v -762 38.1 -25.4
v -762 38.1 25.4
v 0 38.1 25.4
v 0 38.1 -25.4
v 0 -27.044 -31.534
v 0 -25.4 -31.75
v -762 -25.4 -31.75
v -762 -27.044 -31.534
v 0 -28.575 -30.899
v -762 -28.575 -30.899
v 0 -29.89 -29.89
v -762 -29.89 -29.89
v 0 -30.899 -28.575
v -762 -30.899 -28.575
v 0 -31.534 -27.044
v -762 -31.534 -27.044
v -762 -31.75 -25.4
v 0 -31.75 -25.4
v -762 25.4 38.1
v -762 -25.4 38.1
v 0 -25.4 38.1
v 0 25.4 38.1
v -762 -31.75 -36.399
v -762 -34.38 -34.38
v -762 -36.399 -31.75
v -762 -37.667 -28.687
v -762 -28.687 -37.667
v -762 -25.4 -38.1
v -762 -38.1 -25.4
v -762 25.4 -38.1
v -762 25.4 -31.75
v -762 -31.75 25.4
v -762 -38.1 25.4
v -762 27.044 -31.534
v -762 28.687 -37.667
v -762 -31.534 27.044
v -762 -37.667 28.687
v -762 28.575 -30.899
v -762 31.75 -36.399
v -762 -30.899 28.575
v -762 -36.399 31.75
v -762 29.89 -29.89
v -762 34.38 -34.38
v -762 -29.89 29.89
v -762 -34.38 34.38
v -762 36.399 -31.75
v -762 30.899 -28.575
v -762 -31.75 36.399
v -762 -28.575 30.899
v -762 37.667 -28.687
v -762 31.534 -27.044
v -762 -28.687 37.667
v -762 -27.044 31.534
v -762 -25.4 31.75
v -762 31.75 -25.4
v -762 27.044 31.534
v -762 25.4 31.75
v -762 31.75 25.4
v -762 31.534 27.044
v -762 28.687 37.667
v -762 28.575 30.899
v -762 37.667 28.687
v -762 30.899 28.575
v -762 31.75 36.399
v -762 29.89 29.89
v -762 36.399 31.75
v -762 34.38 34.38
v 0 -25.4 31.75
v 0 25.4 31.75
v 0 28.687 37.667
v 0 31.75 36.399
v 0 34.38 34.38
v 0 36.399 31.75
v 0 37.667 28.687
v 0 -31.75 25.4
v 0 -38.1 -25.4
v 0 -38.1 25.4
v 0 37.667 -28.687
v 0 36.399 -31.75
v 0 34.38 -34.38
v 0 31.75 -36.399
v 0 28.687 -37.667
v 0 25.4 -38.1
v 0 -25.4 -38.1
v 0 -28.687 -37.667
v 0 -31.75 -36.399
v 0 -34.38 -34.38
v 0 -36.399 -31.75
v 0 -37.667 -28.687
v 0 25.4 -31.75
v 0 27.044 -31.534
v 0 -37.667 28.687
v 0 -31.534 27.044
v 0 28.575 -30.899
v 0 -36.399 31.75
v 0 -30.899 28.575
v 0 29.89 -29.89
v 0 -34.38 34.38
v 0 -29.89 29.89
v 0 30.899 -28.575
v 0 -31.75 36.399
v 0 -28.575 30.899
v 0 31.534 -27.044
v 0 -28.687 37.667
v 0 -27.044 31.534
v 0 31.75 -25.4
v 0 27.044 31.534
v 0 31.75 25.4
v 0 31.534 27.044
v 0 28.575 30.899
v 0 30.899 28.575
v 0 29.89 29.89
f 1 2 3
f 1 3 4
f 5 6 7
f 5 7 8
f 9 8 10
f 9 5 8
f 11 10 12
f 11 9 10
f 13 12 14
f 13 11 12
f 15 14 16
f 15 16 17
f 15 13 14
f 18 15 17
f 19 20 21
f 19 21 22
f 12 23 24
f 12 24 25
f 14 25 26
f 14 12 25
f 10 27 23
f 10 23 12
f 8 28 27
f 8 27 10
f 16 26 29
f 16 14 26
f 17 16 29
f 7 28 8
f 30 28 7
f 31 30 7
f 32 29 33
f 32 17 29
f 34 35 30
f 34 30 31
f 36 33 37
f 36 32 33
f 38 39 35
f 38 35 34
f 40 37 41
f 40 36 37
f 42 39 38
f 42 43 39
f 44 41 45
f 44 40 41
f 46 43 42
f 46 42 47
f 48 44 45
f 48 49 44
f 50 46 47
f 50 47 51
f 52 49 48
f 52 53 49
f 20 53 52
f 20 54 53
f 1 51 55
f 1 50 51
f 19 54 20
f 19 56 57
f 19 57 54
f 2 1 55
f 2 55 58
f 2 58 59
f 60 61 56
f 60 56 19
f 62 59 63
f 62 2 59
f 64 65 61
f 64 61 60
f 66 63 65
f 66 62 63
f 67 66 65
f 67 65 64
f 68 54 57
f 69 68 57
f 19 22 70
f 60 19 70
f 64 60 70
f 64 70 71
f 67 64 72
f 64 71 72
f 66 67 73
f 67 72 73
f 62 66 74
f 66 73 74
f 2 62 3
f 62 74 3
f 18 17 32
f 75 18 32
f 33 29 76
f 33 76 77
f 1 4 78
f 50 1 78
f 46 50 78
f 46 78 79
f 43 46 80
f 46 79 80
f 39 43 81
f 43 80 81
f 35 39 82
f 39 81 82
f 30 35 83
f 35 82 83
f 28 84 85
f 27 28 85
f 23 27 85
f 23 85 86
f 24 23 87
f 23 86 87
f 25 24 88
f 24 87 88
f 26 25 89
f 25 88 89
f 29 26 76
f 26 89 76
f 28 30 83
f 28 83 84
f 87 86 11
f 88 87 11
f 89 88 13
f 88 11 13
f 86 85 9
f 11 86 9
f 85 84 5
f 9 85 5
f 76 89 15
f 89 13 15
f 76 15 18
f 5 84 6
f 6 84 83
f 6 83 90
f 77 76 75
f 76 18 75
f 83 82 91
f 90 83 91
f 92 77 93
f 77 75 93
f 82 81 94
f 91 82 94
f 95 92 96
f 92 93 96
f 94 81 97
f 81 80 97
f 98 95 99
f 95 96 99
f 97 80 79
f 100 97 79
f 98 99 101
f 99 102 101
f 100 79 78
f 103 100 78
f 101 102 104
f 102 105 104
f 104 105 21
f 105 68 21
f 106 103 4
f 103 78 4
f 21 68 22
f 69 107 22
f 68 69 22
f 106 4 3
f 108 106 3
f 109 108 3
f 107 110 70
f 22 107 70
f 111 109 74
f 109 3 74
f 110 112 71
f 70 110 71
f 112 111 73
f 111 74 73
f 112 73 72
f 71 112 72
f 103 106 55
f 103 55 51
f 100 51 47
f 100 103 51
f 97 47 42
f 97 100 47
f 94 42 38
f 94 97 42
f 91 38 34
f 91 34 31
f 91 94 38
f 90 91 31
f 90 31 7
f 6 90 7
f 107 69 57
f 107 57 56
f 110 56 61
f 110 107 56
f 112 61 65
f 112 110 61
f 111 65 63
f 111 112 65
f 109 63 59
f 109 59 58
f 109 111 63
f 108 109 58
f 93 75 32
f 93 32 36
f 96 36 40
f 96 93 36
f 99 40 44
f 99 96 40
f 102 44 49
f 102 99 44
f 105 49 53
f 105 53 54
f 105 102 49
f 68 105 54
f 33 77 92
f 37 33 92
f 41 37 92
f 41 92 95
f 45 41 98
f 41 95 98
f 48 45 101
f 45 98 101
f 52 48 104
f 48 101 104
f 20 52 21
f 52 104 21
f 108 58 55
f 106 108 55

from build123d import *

# Parameters (mm, degrees)
STRUCTURAL_MEMBER1_DEPTH = 762


with BuildPart() as part:
    # Sketch1 → Structural Member1 (new body)
    with BuildSketch(Plane.ZY):
        with BuildLine():
            Line((-25.4, -38.1), (25.4, -38.1))
            ThreePointArc((25.4, -38.1), (34.380256121, -34.380256121), (38.1, -25.4))
            Line((38.1, -25.4), (38.1, 25.4))
            ThreePointArc((38.1, 25.4), (34.380256121, 34.380256121), (25.4, 38.1))
            Line((25.4, 38.1), (-25.4, 38.1))
            ThreePointArc((-25.4, 38.1), (-34.380256121, 34.380256121), (-38.1, 25.4))
            Line((-38.1, 25.4), (-38.1, -25.4))
            ThreePointArc((-38.1, -25.4), (-34.380256121, -34.380256121), (-25.4, -38.1))
        make_face()
        with BuildLine():
            Line((-25.4, -31.75), (25.4, -31.75))
            ThreePointArc((25.4, -31.75), (29.890128061, -29.890128061), (31.75, -25.4))
            Line((31.75, -25.4), (31.75, 25.4))
            ThreePointArc((31.75, 25.4), (29.890128061, 29.890128061), (25.4, 31.75))
            Line((25.4, 31.75), (-25.4, 31.75))
            ThreePointArc((-25.4, 31.75), (-29.890128061, 29.890128061), (-31.75, 25.4))
            Line((-31.75, 25.4), (-31.75, -25.4))
            ThreePointArc((-31.75, -25.4), (-29.890128061, -29.890128061), (-25.4, -31.75))
        make_face(mode=Mode.SUBTRACT)
    extrude(amount=STRUCTURAL_MEMBER1_DEPTH)


solid = part.part
